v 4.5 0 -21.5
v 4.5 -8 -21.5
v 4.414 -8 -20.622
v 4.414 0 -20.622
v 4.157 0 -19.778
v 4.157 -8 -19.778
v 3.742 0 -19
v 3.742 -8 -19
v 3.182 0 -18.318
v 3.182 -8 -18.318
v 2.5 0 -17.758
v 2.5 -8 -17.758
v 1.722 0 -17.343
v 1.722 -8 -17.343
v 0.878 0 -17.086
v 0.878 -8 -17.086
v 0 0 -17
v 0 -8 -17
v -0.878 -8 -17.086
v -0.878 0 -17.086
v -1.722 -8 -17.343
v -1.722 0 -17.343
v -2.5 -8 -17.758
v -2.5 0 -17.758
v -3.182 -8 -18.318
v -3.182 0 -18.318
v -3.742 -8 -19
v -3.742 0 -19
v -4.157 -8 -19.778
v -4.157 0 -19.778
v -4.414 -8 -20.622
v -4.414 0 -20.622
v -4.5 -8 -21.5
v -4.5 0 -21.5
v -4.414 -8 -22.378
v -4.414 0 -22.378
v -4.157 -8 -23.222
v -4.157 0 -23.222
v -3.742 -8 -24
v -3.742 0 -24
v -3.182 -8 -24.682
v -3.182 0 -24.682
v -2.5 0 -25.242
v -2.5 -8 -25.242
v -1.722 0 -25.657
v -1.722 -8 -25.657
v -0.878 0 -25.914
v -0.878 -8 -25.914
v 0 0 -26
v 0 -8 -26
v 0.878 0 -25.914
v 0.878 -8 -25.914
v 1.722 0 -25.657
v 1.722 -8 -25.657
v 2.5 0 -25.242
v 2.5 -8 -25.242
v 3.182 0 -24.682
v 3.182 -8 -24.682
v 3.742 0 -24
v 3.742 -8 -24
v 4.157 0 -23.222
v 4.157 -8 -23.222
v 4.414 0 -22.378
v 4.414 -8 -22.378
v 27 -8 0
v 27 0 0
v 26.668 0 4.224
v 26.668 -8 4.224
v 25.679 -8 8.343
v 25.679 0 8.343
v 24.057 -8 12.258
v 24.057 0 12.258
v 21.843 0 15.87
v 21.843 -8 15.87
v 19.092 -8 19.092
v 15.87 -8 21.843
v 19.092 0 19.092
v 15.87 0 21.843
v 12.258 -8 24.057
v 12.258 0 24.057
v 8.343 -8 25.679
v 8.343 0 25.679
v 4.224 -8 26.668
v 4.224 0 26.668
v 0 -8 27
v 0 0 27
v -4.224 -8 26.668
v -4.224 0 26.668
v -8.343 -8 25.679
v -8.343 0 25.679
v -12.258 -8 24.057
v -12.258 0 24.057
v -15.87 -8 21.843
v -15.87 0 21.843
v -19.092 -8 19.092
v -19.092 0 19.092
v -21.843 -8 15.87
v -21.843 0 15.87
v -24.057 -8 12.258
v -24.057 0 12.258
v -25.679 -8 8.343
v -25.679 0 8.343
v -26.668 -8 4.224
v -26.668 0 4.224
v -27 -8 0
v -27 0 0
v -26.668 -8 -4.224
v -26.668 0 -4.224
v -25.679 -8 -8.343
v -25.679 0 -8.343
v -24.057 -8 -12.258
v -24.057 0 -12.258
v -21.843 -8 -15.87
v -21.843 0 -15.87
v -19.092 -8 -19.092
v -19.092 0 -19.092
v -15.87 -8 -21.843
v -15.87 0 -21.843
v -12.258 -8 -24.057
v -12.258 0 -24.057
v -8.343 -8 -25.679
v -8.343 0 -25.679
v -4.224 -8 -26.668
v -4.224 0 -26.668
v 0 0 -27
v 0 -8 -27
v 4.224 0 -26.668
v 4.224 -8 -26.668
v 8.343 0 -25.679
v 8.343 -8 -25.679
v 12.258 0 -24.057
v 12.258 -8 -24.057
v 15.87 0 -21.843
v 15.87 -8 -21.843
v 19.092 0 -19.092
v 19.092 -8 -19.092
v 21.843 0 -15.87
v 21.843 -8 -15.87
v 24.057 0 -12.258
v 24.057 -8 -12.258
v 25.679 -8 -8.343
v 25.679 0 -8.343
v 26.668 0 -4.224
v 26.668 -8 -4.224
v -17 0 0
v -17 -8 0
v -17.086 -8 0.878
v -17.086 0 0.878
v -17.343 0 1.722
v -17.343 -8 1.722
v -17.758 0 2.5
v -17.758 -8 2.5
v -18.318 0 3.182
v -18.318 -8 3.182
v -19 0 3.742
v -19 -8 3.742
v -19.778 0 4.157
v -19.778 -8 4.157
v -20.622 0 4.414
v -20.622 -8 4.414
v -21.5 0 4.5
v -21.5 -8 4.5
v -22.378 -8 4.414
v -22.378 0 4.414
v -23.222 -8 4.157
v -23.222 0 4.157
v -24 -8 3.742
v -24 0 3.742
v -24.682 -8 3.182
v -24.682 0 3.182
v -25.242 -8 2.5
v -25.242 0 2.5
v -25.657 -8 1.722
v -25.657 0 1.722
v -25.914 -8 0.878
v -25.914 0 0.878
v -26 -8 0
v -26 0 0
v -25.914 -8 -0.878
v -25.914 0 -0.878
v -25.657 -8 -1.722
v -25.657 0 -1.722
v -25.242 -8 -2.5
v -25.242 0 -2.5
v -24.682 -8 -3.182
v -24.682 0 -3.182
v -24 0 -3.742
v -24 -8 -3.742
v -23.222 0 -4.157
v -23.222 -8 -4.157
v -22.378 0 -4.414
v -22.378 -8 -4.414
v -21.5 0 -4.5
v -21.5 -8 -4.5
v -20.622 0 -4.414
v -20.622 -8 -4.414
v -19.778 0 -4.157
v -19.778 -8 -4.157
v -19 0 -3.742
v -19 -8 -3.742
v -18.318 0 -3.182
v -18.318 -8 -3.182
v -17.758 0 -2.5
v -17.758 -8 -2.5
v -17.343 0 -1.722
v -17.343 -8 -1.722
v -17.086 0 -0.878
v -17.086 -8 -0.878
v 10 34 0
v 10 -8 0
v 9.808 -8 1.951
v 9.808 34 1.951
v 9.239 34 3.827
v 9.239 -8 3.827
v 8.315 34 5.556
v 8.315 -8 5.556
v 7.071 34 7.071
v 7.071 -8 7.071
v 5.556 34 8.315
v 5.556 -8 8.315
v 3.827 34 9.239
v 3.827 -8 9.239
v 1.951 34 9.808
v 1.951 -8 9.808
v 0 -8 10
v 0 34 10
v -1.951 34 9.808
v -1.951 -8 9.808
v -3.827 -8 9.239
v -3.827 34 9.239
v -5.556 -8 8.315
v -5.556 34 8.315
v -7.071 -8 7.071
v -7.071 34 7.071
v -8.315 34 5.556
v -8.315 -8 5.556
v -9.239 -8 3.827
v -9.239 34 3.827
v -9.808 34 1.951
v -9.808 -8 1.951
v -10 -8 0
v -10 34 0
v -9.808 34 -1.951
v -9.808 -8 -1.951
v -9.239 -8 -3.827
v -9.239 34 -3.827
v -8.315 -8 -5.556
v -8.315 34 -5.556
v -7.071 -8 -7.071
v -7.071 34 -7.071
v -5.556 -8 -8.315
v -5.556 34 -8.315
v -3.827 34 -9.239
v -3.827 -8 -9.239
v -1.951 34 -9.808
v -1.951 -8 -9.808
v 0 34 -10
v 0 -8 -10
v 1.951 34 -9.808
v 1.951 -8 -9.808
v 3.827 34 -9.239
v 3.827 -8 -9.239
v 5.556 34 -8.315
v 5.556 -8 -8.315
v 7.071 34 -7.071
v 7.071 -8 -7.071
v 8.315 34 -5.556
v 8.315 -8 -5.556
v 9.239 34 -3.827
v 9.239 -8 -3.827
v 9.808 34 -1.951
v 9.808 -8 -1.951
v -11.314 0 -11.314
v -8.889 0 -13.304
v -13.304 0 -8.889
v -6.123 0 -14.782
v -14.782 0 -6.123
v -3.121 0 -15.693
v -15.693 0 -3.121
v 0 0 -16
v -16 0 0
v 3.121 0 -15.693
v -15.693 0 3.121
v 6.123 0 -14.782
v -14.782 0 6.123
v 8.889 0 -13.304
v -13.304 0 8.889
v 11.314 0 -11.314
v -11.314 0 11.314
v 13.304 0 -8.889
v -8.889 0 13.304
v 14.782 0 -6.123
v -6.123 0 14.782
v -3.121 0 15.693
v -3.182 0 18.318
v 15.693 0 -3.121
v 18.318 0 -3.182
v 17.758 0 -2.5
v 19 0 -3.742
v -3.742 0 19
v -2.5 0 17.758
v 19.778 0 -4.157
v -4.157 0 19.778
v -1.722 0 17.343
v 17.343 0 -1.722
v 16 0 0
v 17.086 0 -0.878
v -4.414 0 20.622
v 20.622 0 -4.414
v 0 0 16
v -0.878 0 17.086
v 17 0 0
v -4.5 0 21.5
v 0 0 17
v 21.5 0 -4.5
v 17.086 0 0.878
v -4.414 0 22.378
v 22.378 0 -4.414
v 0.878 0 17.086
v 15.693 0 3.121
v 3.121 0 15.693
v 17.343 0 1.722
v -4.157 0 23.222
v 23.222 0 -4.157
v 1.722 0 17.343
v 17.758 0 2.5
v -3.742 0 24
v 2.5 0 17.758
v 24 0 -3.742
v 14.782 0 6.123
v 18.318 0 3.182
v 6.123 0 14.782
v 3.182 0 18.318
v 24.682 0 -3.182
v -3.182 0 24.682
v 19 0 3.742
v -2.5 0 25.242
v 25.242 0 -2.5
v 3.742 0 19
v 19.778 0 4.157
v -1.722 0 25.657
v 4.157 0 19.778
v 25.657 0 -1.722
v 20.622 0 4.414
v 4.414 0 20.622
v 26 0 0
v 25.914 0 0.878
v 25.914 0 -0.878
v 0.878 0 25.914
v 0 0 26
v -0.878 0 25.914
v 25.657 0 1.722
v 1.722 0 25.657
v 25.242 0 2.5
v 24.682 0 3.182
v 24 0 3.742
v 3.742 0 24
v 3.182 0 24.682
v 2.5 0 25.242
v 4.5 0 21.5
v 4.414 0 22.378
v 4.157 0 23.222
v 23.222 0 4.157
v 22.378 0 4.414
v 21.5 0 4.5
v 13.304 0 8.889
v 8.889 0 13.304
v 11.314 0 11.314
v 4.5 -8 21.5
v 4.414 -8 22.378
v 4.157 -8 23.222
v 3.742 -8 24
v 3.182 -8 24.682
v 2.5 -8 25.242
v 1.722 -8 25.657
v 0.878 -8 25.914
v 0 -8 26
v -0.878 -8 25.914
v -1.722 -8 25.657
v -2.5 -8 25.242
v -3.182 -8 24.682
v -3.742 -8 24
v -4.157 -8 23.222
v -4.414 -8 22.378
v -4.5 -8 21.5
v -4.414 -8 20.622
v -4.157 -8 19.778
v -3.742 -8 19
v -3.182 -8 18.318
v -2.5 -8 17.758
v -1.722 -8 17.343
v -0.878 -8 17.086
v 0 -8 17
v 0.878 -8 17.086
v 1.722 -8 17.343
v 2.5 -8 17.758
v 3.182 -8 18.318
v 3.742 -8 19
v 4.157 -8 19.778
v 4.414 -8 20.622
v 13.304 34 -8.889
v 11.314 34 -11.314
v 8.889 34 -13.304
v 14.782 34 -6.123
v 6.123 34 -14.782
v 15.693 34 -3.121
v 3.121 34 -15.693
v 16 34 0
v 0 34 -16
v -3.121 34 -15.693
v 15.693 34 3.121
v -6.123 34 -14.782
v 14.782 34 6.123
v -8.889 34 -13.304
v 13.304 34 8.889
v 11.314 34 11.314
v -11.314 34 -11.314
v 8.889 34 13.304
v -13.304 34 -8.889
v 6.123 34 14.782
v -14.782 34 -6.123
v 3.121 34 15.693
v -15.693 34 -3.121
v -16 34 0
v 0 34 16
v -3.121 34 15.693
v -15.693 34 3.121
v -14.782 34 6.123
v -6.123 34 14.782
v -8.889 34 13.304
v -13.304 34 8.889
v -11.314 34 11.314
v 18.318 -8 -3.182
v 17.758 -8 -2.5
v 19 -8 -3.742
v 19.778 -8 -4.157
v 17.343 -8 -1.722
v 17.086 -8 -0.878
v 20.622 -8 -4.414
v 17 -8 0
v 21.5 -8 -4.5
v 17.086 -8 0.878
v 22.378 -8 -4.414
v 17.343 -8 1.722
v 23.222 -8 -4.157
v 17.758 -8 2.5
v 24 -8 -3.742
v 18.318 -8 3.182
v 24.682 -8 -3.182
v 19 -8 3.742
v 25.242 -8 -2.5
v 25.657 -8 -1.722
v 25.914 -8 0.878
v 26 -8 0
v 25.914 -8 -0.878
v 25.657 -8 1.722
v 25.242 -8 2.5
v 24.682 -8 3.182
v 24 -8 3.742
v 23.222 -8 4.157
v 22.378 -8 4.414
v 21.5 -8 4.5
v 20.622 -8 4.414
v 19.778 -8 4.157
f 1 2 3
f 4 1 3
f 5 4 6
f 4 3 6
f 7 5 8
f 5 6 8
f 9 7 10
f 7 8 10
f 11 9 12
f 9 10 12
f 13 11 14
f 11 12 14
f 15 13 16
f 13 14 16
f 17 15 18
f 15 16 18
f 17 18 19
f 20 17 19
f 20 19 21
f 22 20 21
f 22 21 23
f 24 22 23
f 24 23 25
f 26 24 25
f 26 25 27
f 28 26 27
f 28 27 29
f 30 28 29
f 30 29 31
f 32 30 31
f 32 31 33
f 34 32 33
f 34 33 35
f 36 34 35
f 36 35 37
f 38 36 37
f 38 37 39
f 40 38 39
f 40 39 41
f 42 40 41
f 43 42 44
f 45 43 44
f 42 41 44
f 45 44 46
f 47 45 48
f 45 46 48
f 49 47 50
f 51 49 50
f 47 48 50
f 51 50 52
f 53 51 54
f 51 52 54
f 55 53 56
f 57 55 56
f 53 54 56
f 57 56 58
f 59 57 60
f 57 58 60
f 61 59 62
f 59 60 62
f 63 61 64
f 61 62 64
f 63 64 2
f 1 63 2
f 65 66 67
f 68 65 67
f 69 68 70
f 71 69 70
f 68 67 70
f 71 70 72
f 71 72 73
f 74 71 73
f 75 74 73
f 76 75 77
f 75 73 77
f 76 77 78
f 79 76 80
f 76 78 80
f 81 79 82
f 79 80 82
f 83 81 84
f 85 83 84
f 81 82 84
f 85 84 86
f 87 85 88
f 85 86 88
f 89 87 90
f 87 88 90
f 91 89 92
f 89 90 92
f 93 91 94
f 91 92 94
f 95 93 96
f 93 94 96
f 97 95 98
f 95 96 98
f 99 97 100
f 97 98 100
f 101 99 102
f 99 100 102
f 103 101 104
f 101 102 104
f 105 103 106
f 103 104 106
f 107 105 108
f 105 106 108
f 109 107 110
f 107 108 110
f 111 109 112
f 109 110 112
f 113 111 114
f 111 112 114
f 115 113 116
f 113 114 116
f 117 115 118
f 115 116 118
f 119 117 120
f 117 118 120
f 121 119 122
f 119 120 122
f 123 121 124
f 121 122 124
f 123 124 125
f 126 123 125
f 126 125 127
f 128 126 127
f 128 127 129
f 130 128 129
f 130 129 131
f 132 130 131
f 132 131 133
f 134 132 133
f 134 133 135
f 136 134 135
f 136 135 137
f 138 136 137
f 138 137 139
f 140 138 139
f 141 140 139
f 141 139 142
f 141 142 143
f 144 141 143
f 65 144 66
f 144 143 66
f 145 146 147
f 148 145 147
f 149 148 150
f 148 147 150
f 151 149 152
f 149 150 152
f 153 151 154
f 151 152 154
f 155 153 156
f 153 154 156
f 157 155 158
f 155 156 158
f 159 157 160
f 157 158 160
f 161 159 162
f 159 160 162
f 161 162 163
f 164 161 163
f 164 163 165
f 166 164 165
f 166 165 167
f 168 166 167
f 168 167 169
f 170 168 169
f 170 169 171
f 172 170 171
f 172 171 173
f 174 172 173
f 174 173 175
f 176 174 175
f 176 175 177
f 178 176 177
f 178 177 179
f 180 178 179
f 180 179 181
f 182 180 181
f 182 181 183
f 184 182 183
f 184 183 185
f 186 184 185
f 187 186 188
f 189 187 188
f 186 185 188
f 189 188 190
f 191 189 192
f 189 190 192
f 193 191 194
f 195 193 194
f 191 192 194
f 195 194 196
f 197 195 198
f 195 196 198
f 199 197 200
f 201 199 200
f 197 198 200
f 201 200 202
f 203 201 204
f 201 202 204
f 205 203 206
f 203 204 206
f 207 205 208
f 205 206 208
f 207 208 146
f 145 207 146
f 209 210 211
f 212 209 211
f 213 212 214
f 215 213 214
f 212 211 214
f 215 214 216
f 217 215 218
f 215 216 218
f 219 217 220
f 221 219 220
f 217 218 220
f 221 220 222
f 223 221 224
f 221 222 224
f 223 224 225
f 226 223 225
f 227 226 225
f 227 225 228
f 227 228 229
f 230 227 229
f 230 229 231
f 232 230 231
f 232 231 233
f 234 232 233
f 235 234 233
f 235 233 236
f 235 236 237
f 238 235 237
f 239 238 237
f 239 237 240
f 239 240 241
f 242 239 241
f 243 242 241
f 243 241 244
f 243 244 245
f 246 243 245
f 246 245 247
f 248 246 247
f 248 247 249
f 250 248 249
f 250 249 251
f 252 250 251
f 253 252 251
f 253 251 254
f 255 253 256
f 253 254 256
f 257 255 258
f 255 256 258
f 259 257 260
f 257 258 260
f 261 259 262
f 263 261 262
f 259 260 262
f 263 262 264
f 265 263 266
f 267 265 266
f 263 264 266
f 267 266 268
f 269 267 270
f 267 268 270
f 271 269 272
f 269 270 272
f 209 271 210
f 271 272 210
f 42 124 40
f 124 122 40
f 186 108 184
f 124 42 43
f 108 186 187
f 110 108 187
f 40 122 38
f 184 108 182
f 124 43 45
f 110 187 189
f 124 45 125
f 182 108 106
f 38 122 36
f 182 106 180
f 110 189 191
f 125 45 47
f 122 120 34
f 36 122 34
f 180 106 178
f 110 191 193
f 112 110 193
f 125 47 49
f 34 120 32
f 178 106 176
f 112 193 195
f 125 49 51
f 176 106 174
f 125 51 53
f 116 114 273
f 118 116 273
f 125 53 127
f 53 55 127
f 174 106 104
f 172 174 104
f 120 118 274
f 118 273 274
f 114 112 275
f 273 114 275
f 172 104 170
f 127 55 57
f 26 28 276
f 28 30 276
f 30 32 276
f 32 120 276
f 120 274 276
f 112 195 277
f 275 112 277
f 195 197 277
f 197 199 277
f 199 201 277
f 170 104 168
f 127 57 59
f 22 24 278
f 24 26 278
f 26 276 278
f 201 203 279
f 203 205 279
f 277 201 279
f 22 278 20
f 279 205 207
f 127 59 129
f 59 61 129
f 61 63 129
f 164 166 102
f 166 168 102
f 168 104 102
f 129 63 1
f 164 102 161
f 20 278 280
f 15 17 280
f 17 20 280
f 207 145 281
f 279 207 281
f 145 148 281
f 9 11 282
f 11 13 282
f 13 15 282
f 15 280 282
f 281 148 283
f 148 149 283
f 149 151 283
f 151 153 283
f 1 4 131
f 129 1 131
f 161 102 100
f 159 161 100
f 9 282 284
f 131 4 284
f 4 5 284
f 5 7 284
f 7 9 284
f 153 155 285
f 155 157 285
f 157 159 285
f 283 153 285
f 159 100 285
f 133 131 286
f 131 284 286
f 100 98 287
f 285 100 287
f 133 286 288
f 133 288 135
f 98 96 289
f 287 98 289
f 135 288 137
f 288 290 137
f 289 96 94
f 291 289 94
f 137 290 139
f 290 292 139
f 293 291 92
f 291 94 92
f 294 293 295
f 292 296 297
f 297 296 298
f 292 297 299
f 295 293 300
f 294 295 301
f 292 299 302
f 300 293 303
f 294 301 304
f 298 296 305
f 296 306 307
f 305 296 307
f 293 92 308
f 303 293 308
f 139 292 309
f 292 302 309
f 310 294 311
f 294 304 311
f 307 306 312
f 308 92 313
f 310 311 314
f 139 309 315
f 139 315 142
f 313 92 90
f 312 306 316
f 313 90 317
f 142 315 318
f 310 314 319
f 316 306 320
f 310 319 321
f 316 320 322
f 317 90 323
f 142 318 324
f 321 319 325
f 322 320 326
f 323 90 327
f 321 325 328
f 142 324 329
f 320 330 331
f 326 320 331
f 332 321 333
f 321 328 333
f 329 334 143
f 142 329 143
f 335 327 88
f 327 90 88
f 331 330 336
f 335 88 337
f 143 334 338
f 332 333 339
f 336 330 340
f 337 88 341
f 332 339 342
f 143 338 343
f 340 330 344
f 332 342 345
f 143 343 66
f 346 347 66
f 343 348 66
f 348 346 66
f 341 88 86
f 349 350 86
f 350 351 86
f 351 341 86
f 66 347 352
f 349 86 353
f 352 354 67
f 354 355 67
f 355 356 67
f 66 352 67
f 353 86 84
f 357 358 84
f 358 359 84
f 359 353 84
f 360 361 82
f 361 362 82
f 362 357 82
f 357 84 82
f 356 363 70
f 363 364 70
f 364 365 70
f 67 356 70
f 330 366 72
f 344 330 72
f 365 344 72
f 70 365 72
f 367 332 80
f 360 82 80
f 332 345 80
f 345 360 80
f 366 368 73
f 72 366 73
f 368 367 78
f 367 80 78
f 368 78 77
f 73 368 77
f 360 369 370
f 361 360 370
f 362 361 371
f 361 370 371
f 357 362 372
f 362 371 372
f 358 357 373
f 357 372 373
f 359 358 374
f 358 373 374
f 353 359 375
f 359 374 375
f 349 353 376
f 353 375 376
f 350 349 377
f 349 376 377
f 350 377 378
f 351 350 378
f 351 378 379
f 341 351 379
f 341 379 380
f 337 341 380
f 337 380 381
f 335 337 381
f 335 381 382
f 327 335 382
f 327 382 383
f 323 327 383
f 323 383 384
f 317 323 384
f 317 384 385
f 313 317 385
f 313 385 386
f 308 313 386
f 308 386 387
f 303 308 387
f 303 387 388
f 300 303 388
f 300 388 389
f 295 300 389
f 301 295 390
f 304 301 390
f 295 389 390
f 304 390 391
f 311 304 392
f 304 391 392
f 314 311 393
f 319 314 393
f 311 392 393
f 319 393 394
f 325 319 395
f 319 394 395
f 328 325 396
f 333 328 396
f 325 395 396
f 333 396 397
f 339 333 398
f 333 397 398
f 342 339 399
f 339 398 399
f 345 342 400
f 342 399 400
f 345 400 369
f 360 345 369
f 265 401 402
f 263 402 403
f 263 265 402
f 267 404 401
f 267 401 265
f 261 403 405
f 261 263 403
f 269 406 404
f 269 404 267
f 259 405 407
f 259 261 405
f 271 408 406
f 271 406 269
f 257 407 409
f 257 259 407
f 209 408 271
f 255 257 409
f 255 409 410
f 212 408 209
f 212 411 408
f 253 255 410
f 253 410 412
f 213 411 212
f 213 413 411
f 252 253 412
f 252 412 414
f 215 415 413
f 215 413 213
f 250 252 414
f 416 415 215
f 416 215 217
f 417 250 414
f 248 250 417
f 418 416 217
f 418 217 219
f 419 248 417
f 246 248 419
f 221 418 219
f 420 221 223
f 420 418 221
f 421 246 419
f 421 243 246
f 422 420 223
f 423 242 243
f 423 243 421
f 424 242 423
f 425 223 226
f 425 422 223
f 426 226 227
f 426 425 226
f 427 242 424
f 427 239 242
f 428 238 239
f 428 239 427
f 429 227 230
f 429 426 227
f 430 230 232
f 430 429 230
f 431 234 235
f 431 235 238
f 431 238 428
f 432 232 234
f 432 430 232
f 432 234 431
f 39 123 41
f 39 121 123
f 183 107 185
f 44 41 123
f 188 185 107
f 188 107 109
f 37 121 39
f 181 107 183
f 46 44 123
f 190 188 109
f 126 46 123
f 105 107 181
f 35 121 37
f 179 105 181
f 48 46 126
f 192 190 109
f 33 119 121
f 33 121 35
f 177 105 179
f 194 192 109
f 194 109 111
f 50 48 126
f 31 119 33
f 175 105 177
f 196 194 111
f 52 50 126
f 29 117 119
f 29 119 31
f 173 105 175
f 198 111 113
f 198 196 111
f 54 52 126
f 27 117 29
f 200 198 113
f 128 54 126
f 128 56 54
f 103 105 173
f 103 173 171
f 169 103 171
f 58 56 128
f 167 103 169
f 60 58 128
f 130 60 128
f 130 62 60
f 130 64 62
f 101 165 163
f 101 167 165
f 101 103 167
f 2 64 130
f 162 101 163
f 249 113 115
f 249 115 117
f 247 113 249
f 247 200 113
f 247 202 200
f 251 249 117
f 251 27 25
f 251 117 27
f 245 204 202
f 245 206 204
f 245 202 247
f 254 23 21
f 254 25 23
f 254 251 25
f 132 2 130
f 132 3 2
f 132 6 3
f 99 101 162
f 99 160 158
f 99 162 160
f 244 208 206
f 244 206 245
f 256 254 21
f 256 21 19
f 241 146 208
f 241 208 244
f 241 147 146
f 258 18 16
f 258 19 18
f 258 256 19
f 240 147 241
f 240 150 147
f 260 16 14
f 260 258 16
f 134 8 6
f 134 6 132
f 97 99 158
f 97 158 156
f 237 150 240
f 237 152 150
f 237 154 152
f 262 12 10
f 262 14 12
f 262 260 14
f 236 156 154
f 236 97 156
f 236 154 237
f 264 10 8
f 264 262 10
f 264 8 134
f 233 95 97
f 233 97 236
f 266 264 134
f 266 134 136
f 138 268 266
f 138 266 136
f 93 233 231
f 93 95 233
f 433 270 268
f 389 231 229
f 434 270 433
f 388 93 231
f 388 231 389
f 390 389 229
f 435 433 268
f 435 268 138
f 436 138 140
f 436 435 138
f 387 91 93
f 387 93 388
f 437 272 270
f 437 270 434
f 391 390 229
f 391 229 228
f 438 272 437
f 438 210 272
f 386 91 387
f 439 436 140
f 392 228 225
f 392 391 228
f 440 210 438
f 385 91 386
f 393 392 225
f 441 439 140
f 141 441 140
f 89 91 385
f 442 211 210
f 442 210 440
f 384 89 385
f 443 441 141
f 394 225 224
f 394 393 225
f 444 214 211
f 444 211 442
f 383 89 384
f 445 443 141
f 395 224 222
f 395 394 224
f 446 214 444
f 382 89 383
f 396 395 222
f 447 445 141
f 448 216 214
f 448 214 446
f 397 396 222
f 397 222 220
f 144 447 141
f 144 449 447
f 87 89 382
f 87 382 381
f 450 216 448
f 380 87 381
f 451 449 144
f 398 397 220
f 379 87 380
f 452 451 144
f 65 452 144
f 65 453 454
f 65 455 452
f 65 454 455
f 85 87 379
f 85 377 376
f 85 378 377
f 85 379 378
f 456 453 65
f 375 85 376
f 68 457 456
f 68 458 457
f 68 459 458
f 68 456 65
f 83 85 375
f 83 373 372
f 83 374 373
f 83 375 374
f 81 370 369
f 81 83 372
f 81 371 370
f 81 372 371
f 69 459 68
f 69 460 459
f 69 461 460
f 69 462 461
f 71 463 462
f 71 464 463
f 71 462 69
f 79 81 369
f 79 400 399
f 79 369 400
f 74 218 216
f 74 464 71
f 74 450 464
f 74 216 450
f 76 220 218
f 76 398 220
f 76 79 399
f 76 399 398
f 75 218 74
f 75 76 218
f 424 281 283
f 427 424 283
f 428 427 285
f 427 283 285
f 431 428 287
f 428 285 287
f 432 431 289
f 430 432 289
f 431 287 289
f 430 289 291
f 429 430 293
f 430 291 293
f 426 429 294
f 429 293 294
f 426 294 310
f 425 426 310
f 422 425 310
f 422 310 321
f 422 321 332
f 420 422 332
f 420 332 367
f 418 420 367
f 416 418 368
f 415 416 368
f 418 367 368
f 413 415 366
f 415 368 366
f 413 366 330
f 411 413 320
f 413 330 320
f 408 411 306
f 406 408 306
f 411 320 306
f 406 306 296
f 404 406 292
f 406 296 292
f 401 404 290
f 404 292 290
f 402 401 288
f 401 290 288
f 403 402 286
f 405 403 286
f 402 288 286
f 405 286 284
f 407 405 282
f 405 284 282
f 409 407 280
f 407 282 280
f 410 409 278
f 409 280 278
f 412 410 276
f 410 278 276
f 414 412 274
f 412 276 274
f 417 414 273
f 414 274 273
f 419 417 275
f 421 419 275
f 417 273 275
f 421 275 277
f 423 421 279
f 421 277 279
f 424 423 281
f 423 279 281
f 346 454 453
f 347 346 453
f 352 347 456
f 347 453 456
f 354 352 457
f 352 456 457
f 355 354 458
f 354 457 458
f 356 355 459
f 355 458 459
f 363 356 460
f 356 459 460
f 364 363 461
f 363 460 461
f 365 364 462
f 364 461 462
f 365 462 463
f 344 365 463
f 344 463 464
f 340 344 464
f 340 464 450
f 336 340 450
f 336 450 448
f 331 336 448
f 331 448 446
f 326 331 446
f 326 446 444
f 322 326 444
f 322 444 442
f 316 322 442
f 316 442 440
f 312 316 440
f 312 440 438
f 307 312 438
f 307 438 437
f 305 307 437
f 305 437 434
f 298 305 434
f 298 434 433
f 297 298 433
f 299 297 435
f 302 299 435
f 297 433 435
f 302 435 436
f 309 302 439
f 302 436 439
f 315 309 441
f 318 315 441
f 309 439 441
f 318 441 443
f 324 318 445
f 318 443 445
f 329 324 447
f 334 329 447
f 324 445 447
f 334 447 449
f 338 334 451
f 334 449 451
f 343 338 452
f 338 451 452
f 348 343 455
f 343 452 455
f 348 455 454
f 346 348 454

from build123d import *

# Parameters (mm, degrees)
F0_R     = 27
F1_DEPTH = 8
F2_R     = 16
F3_DEPTH = 34
F4_R     = 10
F4_R_2   = 4.5
F5_DEPTH = 50


with BuildPart() as f1:
    # F0 (on Front) → F1 (new body)
    with BuildSketch(Plane.XZ):
        Circle(F0_R)
    extrude(amount=F1_DEPTH)

    # F2 (on face) → F3 (join)
    with BuildSketch(Plane(origin=(0, 0, 0), x_dir=(-1, 0, 0), z_dir=(0, 1, 0))):
        Circle(F2_R)
    extrude(amount=F3_DEPTH)

    # F4 (on face) → F5 (cut)
    with BuildSketch(Plane.XZ.offset(8)):
        Circle(F4_R)
        with Locations((0, 21.5)):
            Circle(F4_R_2)
        with Locations((-21.5, 0)):
            Circle(F4_R_2)
        with Locations((0, -21.5)):
            Circle(F4_R_2)
        with Locations((21.5, 0)):
            Circle(F4_R_2)
    extrude(amount=-F5_DEPTH, mode=Mode.SUBTRACT)


solid = f1.part
